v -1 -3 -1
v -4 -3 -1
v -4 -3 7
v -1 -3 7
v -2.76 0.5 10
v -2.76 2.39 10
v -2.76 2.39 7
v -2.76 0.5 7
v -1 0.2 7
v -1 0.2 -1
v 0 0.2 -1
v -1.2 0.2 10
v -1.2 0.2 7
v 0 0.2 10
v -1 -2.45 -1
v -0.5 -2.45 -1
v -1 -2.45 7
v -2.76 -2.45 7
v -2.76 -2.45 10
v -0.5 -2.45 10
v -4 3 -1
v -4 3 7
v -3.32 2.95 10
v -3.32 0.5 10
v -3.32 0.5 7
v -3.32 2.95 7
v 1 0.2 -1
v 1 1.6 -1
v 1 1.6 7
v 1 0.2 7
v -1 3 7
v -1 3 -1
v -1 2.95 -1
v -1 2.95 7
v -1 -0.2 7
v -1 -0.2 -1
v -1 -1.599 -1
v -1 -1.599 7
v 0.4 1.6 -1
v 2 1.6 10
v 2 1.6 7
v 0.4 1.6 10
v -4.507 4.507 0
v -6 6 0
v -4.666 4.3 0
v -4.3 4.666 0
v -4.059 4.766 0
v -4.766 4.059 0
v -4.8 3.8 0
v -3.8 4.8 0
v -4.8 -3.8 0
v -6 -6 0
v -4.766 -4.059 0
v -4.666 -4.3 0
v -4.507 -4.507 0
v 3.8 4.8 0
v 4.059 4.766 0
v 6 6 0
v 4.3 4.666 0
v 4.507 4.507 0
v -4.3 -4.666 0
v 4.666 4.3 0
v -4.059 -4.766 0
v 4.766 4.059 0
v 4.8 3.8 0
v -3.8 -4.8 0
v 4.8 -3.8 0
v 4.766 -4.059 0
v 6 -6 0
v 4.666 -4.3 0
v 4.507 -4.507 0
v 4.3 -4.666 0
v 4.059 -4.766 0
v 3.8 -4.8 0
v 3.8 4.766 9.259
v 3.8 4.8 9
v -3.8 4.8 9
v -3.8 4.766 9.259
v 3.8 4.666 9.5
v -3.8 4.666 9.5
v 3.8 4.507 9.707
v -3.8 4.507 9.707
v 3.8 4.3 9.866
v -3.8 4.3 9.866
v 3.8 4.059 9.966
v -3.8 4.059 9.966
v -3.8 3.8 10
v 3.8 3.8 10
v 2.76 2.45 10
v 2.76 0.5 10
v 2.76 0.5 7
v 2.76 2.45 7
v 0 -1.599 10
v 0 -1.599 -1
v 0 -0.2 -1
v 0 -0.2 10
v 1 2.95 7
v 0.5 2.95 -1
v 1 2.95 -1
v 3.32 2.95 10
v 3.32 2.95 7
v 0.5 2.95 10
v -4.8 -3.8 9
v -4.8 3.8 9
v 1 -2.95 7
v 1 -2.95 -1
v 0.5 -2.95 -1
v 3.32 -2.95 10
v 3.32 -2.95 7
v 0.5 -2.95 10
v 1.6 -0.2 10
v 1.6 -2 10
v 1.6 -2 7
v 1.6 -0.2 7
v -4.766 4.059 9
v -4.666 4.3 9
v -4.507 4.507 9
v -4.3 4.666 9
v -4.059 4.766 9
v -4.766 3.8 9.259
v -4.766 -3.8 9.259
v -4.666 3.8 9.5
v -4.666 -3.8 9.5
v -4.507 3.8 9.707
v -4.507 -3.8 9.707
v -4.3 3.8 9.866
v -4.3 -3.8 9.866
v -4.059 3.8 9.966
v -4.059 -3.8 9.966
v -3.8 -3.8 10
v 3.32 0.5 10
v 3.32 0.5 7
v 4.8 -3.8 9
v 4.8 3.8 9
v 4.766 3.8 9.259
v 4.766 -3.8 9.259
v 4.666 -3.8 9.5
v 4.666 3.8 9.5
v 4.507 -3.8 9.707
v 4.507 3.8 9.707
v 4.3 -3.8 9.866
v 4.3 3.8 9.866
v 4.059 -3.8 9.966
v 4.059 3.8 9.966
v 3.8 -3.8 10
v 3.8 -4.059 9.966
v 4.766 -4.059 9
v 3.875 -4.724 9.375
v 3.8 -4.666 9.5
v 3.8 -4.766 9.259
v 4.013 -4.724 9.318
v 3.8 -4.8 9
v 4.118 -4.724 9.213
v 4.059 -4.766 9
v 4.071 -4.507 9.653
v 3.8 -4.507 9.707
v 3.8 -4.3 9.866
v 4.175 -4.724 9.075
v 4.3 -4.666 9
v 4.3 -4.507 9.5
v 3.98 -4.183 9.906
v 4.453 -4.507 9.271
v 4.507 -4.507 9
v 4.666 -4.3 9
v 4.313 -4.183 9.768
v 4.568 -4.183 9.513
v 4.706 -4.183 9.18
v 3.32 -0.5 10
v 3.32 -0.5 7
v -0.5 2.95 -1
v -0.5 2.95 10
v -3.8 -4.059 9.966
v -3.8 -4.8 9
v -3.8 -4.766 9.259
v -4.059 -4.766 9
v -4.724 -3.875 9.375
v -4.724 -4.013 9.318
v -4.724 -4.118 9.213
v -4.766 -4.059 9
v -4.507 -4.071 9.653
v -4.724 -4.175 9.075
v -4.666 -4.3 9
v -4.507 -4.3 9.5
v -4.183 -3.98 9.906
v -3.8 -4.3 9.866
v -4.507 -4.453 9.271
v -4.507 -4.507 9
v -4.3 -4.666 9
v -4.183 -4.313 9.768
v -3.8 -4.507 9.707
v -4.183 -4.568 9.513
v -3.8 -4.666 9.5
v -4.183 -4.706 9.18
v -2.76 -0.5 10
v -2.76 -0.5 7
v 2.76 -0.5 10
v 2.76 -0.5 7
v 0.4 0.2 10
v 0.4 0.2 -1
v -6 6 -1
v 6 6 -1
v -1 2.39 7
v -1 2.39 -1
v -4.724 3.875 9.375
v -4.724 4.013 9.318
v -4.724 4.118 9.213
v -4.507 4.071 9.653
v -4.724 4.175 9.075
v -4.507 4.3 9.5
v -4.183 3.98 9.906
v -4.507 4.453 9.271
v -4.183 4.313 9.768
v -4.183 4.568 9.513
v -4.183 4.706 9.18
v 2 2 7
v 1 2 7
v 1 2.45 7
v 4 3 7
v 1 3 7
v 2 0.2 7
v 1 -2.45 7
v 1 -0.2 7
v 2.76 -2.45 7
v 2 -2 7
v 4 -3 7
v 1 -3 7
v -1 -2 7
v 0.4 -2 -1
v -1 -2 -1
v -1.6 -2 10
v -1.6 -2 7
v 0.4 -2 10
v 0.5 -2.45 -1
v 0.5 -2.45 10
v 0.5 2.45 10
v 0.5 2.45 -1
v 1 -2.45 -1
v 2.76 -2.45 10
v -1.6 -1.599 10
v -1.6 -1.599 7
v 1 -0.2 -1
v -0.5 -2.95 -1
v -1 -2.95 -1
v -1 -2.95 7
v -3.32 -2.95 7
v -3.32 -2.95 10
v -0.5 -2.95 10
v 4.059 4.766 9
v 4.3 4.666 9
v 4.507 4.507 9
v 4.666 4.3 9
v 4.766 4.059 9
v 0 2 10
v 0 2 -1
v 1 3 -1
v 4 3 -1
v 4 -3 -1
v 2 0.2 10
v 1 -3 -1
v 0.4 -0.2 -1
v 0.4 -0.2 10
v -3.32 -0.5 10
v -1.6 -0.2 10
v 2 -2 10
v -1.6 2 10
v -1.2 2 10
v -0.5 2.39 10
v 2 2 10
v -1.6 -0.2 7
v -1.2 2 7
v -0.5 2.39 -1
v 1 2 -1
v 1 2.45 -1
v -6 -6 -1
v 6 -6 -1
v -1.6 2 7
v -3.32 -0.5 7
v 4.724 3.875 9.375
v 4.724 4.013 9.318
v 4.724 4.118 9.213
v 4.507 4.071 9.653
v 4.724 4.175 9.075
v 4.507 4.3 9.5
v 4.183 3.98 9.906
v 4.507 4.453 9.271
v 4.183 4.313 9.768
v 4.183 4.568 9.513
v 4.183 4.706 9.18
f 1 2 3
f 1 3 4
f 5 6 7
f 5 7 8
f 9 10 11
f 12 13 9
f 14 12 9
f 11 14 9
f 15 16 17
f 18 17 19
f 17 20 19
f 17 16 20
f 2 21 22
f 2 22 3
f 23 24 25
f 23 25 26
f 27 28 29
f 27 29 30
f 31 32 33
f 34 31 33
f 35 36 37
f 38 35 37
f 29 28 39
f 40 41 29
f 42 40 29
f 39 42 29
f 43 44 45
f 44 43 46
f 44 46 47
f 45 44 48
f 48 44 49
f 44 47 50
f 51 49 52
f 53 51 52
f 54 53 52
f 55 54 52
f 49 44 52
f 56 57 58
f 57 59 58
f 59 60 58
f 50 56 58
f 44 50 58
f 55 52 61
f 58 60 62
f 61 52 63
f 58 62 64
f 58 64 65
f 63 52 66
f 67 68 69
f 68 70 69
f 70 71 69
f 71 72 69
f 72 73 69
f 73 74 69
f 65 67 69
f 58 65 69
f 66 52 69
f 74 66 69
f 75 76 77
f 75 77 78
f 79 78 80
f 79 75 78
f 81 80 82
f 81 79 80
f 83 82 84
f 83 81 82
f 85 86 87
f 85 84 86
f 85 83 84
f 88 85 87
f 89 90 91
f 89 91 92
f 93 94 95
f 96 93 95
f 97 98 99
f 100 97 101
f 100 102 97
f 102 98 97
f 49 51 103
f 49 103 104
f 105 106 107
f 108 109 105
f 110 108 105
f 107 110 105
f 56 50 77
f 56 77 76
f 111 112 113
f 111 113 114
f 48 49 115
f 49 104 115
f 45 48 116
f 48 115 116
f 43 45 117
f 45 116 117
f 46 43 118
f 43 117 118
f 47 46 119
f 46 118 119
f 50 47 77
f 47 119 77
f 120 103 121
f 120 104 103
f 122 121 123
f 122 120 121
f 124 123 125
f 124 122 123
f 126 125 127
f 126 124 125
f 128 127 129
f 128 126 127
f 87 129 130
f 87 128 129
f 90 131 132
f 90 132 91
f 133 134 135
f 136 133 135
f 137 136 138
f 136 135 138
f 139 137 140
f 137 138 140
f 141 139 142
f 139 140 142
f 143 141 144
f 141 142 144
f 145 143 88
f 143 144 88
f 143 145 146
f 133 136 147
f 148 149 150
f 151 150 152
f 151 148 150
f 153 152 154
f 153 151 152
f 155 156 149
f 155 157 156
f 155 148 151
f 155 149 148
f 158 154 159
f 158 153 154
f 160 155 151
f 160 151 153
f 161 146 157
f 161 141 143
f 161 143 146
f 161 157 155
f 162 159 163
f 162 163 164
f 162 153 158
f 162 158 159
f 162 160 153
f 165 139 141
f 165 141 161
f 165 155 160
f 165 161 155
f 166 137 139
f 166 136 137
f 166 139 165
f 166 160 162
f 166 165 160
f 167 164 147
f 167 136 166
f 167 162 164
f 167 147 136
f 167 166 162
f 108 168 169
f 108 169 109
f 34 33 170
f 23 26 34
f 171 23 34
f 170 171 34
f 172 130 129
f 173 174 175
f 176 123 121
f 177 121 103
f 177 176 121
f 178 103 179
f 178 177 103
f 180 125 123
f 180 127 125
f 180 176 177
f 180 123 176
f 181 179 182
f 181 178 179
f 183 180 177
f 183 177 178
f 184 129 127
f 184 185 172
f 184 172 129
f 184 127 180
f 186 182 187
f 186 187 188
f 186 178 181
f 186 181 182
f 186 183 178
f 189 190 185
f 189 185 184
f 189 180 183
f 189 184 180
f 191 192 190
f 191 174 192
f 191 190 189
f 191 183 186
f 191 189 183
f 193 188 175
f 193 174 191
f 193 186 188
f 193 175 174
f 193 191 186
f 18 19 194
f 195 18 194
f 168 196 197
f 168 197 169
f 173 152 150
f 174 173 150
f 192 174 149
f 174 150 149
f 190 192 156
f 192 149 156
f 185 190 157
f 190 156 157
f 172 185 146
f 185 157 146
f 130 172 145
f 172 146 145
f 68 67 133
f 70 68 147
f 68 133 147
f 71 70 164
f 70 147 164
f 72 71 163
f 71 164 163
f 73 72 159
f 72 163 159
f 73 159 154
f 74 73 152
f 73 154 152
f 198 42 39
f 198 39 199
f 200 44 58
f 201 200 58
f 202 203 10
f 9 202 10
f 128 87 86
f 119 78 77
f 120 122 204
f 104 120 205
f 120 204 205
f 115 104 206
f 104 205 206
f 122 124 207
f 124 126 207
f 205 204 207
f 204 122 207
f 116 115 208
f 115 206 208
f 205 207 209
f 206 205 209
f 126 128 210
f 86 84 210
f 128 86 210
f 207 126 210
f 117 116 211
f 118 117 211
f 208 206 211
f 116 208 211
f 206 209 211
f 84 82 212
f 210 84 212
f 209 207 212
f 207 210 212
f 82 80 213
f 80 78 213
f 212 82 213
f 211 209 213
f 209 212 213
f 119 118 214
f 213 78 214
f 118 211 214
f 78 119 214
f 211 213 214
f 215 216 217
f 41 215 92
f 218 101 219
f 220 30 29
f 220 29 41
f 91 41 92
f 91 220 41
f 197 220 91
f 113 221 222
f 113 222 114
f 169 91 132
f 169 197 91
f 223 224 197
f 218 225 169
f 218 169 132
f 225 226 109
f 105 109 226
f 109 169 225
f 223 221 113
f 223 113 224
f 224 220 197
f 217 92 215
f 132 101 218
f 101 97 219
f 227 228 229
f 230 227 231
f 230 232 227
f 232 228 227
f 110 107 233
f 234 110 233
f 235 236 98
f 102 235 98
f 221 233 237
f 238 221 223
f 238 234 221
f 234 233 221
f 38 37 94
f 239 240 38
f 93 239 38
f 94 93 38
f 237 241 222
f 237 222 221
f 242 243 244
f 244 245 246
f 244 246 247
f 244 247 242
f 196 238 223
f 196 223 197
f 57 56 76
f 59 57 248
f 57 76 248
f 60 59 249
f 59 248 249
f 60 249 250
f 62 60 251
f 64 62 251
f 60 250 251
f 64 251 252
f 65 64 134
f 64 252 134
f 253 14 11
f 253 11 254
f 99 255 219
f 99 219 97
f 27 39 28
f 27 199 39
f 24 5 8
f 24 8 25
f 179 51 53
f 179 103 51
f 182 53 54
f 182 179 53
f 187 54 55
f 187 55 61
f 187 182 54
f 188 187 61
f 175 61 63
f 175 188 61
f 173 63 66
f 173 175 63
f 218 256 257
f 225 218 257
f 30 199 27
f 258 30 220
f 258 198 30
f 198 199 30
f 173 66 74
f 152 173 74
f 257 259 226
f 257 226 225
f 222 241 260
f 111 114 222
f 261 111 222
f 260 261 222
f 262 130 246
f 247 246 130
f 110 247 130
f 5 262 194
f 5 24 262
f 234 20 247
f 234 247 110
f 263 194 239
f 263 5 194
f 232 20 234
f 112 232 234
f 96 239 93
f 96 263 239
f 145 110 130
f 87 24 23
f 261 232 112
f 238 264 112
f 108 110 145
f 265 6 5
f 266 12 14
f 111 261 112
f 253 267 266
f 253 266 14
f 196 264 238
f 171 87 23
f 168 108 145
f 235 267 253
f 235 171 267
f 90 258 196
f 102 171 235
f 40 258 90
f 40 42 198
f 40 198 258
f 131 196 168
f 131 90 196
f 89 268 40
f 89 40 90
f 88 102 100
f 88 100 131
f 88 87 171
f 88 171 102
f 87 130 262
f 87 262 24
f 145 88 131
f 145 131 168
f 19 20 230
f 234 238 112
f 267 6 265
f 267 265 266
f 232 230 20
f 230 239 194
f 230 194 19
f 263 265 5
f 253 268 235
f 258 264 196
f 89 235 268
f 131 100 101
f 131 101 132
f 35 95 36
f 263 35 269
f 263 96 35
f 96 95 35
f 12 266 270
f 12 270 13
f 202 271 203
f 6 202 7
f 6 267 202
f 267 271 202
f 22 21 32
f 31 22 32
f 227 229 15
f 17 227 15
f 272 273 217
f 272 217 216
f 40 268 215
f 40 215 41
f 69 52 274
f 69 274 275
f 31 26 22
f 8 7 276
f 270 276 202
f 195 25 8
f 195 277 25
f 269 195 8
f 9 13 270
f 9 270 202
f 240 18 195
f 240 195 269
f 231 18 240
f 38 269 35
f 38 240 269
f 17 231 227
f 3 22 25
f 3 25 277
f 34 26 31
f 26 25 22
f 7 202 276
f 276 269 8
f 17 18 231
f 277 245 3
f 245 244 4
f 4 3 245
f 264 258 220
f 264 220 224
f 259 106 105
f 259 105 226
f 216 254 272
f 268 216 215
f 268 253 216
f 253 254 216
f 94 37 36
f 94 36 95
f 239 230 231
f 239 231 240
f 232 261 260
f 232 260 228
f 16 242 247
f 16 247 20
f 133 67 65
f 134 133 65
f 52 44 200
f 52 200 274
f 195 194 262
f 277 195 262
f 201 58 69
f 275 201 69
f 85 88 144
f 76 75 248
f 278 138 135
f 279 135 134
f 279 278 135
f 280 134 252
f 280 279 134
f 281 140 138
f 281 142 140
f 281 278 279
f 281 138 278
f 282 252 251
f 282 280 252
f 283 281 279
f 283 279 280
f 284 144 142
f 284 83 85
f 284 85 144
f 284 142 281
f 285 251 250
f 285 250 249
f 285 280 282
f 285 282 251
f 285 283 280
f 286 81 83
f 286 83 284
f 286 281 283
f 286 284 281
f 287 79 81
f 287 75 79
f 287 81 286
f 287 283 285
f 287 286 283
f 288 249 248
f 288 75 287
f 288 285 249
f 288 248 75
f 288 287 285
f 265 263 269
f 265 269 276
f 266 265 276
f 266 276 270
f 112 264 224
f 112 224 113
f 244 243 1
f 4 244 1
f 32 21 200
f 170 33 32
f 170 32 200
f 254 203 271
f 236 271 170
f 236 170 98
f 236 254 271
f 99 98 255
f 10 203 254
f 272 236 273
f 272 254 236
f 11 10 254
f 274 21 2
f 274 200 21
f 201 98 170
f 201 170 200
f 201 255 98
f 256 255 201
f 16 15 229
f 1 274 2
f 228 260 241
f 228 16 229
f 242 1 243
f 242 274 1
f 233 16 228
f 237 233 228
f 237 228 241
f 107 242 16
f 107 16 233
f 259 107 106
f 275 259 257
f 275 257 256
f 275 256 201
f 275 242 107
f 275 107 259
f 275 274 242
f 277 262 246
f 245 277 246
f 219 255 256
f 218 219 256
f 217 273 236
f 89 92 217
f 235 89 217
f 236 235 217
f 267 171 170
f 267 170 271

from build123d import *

# Parameters (mm, degrees)
SKETCH_W        = 9.6
SKETCH_H        = 9.6
PAD_DEPTH       = 10
SKETCH002_W     = 12
SKETCH002_H     = 12
PAD001_DEPTH    = 1
SKETCH003_W     = 3
SKETCH003_H     = 6
POCKET_DEPTH    = 9
SKETCH004_W     = 3
SKETCH004_H     = 6
POCKET001_DEPTH = 9
POCKET002_DEPTH = 11.001
POCKET003_DEPTH = 11.001
POCKET004_DEPTH = 11.001
POCKET005_DEPTH = 11.001
FILLET_R        = 1
POCKET006_DEPTH = 11.001


with BuildPart() as part:
    # Sketch → Pad (new body)
    with BuildSketch(Plane.XY):
        Rectangle(SKETCH_W, SKETCH_H)
    extrude(amount=PAD_DEPTH)

    # Sketch002 → Pad001 (join)
    with BuildSketch(Plane(origin=(0, 0, 0), x_dir=(1, 0, 0), z_dir=(0, 0, -1))):
        Rectangle(SKETCH002_W, SKETCH002_H)
    extrude(amount=PAD001_DEPTH)

    # Sketch003 → Pocket (cut)
    with BuildSketch(Plane(origin=(0, 0, -2), x_dir=(1, 0, 0), z_dir=(0, 0, -1))):
        with Locations((-2.5, 0)):
            Rectangle(SKETCH003_W, SKETCH003_H)
    extrude(amount=-POCKET_DEPTH, mode=Mode.SUBTRACT)

    # Sketch004 → Pocket001 (cut)
    with BuildSketch(Plane(origin=(0, 0, -2), x_dir=(1, 0, 0), z_dir=(0, 0, -1))):
        with Locations((2.5, 0)):
            Rectangle(SKETCH004_W, SKETCH004_H)
    extrude(amount=-POCKET001_DEPTH, mode=Mode.SUBTRACT)

    # Sketch001 → Pocket002 (cut, through all)
    with BuildSketch(Plane.XY.offset(10)):
        Polygon((3.32, -0.5), (3.32, -2.95), (0.5, -2.95), (0.5, -2.45), (2.76, -2.45), (2.76, -0.5), align=None)
    extrude(amount=-POCKET002_DEPTH, mode=Mode.SUBTRACT)

    # Sketch005 → Pocket003 (cut, through all)
    with BuildSketch(Plane.XY.offset(10)):
        Polygon((-3.32, -0.5), (-3.32, -2.95), (-0.5, -2.95), (-0.5, -2.45), (-2.76, -2.45), (-2.76, -0.5), align=None)
    extrude(amount=-POCKET003_DEPTH, mode=Mode.SUBTRACT)

    # Sketch007 → Pocket004 (cut, through all)
    with BuildSketch(Plane.XY.offset(10)):
        Polygon((-2.76, 0.5), (-3.32, 0.5), (-3.32, 2.95), (-0.5, 2.95), (-0.5, 2.39), (-2.76, 2.39), align=None)
    extrude(amount=-POCKET004_DEPTH, mode=Mode.SUBTRACT)

    # Sketch006 → Pocket005 (cut, through all)
    with BuildSketch(Plane.XY.offset(10)):
        Polygon((0.5, 2.95), (3.32, 2.95), (3.32, 0.5), (2.76, 0.5), (2.76, 2.45), (0.5, 2.45), align=None)
    extrude(amount=-POCKET005_DEPTH, mode=Mode.SUBTRACT)

    # Fillet
    fillet_edges = [part.edges().sort_by_distance(p)[0] for p in [
        (0, 4.8, 10),
        (4.8, 0, 10),
        (0, -4.8, 10),
        (4.8, -4.8, 5),
        (4.8, 4.8, 5),
        (-4.8, 0, 10),
        (-4.8, -4.8, 5),
        (-4.8, 4.8, 5),
    ]]
    fillet(fillet_edges, radius=FILLET_R)

    # Sketch008 (on Face23 of Fillet) → Pocket006 (cut, through all)
    with BuildSketch(Plane.XY.offset(10)):
        Polygon((0.4, -0.2), (0.4, -2), (-1.6, -2), (-1.6, -1.598578), (0, -1.598578), (0, -0.2), (-1.6, -0.2), (-1.6, 2), (-1.2, 2), (-1.2, 0.2), (0, 0.2), (0, 2), (2, 2), (2, 1.6), (0.4, 1.6), (0.4, 0.2), (2, 0.2), (2, -2), (1.6, -2), (1.6, -0.2), align=None)
    extrude(amount=-POCKET006_DEPTH, mode=Mode.SUBTRACT)


solid = part.part
